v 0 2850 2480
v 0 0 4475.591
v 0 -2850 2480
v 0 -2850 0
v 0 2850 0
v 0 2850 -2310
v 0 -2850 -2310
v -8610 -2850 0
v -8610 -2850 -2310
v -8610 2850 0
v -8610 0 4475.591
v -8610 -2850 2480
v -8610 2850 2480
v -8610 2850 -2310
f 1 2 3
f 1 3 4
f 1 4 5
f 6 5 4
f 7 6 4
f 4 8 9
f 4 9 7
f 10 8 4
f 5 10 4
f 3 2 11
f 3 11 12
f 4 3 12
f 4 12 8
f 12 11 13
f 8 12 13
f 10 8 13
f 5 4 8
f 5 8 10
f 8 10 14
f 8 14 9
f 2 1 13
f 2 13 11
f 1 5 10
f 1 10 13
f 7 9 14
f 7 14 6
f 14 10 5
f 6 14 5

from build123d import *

# Parameters (mm, degrees)
F1_DEPTH  = 8610
F1_FACE_W = 8610
F1_FACE_H = 5700
F2_DEPTH  = 2310


with BuildPart() as f1:
    # F0 (on Right) → F1 (new body)
    with BuildSketch(Plane.YZ):
        Polygon((2850, 2480), (0, 4475.591484), (-2850, 2480), (-2850, 0), (2850, 0), align=None)
    extrude(amount=-F1_DEPTH)


with BuildPart() as f2:
    # F1_face (on face) → F2 (new body)
    with BuildSketch(Plane(origin=(-4305, 0, 0), x_dir=(1, 0, 0), z_dir=(0, 0, -1))):
        Rectangle(F1_FACE_W, F1_FACE_H)
    extrude(amount=F2_DEPTH)


solid = Compound([f1.part, f2.part])
